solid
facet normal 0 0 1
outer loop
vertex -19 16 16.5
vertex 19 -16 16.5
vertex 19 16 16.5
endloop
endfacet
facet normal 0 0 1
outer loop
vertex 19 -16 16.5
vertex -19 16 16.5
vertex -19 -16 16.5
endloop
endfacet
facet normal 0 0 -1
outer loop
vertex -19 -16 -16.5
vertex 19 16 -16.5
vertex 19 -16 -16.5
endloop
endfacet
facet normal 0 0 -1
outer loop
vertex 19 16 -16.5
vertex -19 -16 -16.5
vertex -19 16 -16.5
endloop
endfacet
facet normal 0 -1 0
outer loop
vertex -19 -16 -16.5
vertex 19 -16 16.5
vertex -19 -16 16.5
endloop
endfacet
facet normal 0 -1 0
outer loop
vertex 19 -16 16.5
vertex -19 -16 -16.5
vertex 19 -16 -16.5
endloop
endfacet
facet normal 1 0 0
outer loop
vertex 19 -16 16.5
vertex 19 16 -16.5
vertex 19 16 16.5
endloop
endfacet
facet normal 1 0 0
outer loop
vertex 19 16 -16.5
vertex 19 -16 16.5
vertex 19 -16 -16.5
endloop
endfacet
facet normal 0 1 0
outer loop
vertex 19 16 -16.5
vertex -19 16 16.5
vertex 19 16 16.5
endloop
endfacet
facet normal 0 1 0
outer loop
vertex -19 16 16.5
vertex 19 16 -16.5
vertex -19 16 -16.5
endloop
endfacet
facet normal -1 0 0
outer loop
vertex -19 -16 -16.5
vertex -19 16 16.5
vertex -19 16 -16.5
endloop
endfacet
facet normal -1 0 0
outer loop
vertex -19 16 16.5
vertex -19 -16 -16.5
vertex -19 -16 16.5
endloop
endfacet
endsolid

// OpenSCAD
// Parameters
width_mm = 38.0; //[19.0:76.0:0.5]
depth_mm = 32.0; //[16.0:64.0:0.5]
height_mm = 33.0; //[16.5:66.0:0.5]

// Transformer - complete geometry
module transformer() {
  color("DimGray") {
    // Main body
    cube([width_mm, depth_mm, height_mm], center=true);
  }
}

// Assembly
module assembly() {
  transformer();
}

assembly();
